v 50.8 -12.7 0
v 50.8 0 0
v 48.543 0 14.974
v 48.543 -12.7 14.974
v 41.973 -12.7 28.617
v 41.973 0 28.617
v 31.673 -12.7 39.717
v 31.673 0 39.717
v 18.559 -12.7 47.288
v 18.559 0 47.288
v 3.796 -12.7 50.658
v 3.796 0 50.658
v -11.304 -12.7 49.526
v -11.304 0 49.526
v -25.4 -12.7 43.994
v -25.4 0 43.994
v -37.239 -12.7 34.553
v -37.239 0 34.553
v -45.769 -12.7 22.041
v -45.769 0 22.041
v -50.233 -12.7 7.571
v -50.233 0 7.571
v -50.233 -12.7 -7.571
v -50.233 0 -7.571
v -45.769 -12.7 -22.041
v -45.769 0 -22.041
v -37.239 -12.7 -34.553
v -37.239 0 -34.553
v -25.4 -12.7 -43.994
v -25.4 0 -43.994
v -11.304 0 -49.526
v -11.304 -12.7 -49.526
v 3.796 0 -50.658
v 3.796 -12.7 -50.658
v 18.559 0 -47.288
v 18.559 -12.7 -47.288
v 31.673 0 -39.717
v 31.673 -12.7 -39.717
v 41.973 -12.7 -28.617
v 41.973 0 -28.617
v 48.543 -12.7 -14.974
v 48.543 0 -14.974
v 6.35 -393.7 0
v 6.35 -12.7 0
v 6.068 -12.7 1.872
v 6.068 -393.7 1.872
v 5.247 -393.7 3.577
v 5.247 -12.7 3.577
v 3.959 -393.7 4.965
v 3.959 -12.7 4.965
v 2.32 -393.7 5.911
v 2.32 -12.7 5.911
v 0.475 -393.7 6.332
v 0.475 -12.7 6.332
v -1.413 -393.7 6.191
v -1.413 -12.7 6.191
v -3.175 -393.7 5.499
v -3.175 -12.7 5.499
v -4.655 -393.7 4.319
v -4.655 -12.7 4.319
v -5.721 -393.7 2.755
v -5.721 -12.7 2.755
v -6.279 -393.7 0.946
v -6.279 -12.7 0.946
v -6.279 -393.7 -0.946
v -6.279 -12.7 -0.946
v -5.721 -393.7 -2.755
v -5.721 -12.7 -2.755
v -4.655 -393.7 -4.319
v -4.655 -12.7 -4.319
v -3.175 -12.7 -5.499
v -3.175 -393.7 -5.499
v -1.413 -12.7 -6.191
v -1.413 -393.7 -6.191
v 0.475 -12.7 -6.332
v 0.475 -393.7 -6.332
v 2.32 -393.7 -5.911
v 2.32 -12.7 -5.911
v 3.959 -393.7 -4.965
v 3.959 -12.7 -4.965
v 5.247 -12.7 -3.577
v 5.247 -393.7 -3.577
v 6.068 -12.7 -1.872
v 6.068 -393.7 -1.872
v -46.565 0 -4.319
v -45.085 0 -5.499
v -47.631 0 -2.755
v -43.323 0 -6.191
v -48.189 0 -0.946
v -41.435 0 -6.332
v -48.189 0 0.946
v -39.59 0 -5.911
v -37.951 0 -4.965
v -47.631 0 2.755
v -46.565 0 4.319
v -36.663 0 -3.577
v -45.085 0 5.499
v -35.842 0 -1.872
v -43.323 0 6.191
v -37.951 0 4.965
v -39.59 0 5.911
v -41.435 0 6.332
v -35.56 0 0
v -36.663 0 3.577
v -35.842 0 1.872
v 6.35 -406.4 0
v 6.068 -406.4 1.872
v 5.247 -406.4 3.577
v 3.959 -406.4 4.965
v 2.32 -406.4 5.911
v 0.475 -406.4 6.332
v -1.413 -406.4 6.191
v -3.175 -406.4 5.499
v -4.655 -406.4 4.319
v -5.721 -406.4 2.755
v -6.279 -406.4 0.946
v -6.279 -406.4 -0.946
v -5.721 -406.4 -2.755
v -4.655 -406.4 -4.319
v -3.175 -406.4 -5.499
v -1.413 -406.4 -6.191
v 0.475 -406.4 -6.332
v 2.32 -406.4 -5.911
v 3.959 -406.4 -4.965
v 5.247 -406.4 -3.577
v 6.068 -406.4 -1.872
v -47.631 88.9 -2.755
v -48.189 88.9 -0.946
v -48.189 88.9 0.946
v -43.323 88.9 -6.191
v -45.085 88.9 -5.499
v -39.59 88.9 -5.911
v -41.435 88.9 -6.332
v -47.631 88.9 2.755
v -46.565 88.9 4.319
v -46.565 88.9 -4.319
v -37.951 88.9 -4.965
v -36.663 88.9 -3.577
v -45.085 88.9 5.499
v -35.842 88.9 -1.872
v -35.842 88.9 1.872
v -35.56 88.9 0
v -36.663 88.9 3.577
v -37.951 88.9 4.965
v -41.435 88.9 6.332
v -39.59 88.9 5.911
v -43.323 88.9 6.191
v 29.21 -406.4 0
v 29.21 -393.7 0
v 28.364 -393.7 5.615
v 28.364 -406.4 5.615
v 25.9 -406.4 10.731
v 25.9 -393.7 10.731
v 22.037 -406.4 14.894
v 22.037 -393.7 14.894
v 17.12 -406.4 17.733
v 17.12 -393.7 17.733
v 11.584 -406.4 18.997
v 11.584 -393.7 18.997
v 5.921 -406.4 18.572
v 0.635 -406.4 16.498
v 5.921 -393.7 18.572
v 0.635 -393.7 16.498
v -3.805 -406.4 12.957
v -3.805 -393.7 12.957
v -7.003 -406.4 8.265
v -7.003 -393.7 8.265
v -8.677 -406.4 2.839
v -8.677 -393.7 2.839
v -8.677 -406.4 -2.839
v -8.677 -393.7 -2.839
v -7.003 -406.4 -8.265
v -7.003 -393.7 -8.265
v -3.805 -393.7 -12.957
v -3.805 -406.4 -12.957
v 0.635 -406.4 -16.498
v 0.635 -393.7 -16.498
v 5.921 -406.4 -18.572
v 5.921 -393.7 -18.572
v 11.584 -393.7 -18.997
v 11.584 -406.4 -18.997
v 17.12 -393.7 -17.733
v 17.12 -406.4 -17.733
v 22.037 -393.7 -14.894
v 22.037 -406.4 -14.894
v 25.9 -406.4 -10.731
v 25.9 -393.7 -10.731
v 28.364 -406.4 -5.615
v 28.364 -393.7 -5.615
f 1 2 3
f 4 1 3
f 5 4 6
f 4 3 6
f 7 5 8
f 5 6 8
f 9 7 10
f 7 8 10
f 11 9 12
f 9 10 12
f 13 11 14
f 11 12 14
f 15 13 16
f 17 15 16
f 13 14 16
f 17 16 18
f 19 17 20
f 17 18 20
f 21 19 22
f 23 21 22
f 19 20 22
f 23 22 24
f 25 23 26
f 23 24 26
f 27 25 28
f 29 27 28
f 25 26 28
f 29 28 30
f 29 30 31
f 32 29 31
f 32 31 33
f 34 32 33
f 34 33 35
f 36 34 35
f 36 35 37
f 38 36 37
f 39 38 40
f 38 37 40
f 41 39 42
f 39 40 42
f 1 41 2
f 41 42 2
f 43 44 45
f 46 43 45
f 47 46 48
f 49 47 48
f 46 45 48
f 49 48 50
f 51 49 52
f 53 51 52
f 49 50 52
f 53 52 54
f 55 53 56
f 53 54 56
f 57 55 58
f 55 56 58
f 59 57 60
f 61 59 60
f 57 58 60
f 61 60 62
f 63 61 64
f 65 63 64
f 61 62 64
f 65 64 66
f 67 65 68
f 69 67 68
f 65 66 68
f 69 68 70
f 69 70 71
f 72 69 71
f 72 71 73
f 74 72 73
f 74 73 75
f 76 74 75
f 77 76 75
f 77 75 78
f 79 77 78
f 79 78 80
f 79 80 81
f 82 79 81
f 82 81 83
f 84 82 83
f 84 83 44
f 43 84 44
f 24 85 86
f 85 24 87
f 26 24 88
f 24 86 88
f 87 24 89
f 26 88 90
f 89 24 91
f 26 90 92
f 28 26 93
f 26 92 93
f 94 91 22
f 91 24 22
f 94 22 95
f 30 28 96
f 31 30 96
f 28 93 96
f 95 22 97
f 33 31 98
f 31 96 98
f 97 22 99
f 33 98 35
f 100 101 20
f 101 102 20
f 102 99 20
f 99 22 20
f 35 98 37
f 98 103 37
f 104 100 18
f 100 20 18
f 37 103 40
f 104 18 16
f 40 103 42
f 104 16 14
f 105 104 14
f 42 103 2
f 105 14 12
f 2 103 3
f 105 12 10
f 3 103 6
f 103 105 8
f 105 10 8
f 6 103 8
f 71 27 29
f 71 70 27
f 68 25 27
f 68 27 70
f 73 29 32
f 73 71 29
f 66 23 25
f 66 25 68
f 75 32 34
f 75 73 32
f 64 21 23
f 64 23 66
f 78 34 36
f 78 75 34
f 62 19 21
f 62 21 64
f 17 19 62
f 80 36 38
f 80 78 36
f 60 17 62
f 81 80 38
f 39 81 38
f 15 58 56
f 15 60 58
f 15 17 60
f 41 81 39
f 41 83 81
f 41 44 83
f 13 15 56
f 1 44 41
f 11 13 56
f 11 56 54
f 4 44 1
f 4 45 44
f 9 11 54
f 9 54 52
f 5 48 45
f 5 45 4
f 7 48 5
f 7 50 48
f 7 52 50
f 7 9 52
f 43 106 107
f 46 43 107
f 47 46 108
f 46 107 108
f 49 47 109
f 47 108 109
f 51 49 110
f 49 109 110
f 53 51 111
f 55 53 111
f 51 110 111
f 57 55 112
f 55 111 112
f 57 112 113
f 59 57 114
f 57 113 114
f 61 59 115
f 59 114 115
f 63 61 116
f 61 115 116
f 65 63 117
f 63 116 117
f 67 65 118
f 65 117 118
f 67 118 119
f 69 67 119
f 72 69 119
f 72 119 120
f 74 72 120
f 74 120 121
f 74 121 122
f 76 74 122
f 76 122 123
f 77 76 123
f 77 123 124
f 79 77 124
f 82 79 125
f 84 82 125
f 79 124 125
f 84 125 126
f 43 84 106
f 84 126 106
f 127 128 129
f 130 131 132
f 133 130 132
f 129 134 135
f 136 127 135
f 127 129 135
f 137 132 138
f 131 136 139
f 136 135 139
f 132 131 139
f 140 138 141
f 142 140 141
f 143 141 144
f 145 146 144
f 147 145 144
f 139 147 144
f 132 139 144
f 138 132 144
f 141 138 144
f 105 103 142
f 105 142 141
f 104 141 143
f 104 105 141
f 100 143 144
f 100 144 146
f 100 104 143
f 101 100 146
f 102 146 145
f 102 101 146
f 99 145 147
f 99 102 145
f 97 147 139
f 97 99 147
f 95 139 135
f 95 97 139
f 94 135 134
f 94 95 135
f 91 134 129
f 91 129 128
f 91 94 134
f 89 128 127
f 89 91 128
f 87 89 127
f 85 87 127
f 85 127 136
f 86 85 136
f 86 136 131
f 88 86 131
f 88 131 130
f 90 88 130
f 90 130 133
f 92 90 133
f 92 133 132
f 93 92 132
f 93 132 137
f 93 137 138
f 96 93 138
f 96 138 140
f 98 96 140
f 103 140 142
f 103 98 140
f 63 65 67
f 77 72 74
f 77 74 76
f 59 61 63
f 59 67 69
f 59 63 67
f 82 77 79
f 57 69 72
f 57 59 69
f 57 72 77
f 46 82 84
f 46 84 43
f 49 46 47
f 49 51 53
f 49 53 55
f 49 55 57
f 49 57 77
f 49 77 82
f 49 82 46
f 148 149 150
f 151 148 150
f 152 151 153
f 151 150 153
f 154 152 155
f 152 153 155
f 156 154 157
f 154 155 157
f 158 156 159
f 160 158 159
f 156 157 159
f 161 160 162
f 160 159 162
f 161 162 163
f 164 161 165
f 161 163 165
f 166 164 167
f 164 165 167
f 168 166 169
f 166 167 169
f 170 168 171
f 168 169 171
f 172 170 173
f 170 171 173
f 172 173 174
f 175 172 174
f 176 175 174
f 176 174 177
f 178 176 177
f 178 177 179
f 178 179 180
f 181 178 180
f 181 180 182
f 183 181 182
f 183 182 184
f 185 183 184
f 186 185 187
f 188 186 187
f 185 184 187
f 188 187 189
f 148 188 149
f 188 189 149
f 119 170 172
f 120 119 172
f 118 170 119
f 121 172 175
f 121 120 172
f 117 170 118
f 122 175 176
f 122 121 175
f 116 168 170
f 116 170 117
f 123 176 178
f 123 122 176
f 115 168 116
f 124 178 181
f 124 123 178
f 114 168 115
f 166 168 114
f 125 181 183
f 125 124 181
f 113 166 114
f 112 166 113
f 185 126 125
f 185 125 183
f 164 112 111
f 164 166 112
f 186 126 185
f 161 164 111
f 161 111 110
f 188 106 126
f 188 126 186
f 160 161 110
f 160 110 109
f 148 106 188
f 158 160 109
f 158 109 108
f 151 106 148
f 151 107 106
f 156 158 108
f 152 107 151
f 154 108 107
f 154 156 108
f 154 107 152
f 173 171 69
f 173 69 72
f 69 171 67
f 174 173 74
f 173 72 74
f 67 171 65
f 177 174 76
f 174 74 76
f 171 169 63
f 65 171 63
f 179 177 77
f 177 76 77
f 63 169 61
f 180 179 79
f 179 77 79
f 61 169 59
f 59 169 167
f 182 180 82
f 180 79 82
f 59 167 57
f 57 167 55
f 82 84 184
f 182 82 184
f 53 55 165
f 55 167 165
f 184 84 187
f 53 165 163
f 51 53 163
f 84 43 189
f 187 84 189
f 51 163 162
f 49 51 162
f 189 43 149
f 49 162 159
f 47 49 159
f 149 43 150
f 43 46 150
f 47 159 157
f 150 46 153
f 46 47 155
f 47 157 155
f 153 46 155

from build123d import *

# Parameters (mm, degrees)
F0_R      = 6.35
F1_DEPTH  = 393.7
F0_R_2    = 50.8
F2_DEPTH  = 12.7
F3_R      = 6.35
F4_DEPTH  = 88.9
F7_R      = 19.05
F8_DEPTH  = 12.7
F9_R      = 6.35
F10_DEPTH = 12.7


with BuildPart() as f1:
    # F0 (on Front) → F1 (new body)
    with BuildSketch(Plane.XZ):
        Circle(F0_R)
    extrude(amount=F1_DEPTH)

    # F0 (on Front) → F2 (join)
    with BuildSketch(Plane.XZ):
        Circle(F0_R_2)
        Circle(F0_R, mode=Mode.SUBTRACT)
    extrude(amount=F2_DEPTH)

    # F3 (on face) → F4 (join)
    with BuildSketch(Plane.XZ):
        with Locations((-41.91, 0)):
            Circle(F3_R)
    extrude(amount=-F4_DEPTH)


with BuildPart() as f8:
    # F7 (on face) → F8 (new body)
    with BuildSketch(Plane.XZ.offset(393.7)):
        with Locations((10.16, 0)):
            Circle(F7_R)
    extrude(amount=F8_DEPTH)

    # F9 (on face) → F10 (cut)
    with BuildSketch(Plane.XZ.offset(406.4)):
        Circle(F9_R)
    extrude(amount=-F10_DEPTH, mode=Mode.SUBTRACT)


solid = Compound([f1.part, f8.part])
